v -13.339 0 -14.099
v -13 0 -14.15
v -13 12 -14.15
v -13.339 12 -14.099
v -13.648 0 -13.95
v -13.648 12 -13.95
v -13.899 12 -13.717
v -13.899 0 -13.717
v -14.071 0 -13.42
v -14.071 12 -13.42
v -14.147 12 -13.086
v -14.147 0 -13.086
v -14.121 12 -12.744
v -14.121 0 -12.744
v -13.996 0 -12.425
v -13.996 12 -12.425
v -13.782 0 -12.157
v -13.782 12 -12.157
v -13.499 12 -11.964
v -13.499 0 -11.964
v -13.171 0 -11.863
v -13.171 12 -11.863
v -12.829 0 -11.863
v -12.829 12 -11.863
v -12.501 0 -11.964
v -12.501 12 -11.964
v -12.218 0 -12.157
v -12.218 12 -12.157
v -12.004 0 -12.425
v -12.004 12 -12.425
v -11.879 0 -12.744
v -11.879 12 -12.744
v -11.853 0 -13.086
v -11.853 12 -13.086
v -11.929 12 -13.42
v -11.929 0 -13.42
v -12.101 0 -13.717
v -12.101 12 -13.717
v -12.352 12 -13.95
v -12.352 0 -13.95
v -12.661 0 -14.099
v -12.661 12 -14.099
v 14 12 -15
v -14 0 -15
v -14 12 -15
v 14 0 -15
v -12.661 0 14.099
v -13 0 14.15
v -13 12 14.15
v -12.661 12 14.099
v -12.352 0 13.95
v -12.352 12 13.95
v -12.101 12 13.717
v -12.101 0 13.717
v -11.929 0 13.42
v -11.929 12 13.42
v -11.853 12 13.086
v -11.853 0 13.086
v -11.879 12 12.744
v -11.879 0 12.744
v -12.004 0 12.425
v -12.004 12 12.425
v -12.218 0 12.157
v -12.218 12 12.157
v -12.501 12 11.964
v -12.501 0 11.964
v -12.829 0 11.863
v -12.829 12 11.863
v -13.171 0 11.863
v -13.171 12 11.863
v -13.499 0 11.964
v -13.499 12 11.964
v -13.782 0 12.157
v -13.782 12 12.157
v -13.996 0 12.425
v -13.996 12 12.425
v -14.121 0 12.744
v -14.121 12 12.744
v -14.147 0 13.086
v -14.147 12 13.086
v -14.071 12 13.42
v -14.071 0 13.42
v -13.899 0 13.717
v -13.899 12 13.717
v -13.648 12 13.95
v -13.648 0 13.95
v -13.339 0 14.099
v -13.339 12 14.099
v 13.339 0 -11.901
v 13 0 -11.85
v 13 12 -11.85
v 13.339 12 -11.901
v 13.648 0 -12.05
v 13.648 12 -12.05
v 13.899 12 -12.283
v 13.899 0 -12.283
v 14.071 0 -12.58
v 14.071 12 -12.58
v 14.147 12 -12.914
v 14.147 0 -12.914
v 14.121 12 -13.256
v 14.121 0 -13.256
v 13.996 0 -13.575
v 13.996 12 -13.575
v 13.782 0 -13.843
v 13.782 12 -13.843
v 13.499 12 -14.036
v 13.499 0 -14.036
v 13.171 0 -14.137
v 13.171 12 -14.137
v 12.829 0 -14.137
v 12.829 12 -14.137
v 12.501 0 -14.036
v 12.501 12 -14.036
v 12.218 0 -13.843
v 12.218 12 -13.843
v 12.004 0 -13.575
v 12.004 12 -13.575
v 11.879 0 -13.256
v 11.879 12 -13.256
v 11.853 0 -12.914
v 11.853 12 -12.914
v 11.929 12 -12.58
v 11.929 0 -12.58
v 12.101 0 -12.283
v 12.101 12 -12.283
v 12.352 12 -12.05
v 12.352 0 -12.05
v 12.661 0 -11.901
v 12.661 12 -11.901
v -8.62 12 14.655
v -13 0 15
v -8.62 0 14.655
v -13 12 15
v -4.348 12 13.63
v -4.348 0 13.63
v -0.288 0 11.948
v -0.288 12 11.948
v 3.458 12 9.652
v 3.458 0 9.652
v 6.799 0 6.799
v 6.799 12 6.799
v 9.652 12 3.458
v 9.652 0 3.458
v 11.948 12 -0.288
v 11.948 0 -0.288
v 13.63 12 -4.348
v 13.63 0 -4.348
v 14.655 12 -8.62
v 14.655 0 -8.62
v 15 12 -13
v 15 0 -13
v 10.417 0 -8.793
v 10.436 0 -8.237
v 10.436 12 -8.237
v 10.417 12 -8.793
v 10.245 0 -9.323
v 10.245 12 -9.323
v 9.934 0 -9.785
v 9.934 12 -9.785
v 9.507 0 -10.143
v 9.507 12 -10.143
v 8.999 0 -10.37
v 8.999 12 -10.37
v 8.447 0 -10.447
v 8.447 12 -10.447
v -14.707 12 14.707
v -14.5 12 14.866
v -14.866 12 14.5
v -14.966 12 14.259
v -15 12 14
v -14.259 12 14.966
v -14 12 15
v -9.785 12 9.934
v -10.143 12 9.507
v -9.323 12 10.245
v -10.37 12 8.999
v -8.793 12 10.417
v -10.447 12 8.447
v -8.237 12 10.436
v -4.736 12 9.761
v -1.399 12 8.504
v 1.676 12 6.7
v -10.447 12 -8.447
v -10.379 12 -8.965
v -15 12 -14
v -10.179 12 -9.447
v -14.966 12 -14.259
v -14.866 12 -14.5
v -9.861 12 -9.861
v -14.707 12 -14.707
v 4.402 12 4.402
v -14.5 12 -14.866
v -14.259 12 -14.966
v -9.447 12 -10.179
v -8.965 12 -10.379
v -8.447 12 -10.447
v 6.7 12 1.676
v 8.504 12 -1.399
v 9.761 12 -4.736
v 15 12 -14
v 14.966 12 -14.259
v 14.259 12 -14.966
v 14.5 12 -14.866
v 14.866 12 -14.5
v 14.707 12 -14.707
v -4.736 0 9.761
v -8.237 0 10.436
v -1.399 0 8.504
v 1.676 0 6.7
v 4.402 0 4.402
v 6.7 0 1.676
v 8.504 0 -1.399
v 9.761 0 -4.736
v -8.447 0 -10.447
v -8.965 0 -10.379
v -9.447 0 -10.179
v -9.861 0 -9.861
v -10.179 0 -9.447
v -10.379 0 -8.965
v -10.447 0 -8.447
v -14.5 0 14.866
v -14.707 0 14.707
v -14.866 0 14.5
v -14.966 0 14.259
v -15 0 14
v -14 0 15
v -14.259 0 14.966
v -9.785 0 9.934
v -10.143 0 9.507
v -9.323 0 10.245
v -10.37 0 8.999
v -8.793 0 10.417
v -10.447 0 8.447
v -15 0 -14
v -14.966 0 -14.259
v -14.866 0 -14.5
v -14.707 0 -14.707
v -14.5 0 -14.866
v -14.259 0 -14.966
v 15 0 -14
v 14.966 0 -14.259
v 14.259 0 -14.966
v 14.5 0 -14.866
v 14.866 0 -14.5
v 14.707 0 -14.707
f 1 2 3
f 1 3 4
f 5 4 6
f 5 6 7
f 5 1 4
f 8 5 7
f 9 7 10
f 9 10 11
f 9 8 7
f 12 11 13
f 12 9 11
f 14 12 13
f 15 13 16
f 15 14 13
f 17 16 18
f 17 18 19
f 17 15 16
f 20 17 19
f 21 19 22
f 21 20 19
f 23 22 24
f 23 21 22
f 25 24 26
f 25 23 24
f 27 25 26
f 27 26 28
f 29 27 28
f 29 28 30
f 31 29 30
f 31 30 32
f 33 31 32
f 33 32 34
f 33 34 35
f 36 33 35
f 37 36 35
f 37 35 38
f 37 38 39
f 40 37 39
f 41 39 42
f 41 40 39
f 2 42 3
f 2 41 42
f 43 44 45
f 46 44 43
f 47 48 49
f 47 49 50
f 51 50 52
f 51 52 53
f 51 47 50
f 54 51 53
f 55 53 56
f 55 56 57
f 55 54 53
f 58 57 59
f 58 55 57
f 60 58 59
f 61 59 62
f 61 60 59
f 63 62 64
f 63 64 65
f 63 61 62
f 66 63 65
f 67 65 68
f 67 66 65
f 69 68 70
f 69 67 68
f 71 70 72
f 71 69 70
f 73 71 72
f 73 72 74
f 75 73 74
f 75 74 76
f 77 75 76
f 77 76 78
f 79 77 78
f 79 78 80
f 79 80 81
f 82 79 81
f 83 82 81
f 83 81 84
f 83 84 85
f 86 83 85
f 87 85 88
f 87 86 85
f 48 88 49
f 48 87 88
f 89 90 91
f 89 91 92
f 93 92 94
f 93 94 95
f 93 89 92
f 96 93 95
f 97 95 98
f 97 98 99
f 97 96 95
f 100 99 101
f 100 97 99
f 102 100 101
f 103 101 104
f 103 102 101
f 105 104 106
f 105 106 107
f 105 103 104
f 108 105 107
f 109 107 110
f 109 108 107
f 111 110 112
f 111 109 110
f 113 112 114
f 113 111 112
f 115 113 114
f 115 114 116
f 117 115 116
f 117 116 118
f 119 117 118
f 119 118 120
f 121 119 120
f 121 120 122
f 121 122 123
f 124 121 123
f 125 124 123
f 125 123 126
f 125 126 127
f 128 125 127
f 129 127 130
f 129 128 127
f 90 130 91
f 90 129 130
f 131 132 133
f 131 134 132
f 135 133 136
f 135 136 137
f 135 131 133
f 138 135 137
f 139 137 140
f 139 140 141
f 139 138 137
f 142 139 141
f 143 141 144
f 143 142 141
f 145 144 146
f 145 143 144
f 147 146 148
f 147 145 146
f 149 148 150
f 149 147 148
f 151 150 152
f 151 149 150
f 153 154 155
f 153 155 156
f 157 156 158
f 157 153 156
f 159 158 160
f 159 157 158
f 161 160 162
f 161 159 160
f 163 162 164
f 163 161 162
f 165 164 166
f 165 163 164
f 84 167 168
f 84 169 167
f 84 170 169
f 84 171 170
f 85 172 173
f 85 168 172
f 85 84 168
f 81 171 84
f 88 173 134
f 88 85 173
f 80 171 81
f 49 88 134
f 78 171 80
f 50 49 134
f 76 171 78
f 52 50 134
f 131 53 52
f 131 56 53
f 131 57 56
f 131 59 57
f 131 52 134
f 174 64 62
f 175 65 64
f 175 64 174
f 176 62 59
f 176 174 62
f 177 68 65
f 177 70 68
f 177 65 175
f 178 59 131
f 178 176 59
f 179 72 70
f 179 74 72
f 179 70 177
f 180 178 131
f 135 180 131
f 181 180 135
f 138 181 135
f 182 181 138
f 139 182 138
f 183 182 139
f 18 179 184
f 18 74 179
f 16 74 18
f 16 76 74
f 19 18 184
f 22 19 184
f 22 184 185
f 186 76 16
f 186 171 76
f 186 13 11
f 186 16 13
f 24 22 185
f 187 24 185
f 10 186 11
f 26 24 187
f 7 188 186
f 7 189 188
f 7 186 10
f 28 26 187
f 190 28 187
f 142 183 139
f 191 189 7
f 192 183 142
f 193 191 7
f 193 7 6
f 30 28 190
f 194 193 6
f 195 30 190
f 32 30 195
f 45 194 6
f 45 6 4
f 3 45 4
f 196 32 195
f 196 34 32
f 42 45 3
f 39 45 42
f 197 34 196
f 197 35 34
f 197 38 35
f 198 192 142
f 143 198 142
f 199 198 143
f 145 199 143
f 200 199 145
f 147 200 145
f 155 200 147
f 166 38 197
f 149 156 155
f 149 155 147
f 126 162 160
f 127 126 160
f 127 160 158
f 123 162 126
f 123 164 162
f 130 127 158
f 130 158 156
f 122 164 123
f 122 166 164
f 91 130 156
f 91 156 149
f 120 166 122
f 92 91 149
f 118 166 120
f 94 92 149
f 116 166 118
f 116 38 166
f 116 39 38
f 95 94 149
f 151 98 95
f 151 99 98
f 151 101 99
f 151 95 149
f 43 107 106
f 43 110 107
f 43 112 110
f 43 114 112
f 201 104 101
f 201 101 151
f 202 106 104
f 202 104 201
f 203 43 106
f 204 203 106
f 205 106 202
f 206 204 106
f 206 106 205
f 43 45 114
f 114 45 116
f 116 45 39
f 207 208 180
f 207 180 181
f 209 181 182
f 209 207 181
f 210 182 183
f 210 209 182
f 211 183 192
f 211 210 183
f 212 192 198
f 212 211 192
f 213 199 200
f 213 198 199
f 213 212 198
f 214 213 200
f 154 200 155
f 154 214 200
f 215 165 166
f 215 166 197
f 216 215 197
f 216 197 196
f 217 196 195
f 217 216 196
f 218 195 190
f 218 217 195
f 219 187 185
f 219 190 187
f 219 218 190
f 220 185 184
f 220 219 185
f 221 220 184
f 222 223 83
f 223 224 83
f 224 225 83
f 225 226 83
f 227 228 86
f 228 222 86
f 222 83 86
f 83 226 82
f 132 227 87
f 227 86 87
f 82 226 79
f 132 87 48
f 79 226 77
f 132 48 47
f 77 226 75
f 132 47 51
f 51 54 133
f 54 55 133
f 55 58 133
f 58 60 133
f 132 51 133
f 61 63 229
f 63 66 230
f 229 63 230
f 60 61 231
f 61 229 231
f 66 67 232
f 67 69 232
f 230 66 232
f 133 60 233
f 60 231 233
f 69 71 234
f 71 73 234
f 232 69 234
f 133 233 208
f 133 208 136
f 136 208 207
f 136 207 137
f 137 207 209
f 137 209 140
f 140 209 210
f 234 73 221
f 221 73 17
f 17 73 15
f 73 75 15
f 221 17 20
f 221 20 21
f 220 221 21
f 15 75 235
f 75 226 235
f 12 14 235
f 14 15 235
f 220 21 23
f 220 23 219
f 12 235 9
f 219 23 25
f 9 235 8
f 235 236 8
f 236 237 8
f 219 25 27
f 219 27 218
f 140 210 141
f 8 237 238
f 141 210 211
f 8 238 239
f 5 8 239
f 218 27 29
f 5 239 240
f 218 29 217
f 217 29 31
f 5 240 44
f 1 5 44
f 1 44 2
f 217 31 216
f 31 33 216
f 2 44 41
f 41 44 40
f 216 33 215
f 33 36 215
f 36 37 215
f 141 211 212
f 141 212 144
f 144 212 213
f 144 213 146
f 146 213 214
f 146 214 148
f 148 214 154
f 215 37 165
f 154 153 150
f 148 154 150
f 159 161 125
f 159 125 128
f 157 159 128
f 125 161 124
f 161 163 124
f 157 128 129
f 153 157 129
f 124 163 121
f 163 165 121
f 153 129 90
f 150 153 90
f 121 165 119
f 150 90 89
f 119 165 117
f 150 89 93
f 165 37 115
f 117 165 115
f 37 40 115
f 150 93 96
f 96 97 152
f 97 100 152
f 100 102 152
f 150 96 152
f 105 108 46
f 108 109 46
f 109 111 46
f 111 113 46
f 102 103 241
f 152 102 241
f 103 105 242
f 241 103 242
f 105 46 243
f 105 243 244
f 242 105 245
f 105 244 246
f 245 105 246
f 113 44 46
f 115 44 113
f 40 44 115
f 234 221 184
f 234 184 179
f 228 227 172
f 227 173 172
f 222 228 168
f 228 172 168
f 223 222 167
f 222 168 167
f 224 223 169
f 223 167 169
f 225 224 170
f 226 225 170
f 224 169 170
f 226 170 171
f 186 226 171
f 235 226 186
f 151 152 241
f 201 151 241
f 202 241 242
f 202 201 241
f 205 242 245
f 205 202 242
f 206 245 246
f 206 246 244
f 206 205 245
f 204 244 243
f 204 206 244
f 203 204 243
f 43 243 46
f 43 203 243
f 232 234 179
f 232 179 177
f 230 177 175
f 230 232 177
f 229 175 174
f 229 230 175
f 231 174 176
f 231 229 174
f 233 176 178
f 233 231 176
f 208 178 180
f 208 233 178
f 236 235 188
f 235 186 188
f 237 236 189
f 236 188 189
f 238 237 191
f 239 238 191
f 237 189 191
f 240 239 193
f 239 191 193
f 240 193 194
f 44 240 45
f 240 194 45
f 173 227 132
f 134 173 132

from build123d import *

# Parameters (mm, degrees)
SKETCH_1_W          = 30
SKETCH_1_H          = 30
SKETCH_1_R          = 1.15
EXTRUDE_1_DEPTH     = 12
FILLET_1_R          = 28
FILLET_2_R          = 1
CUT_EXTRUDE_3_DEPTH = 22


with BuildPart() as part:
    # 草图1 → 凸台-拉伸1 (new body)
    with BuildSketch(Plane(origin=(0, 0, 0), x_dir=(1, 0, 0), z_dir=(0, 1, 0))):
        Rectangle(SKETCH_1_W, SKETCH_1_H)
        with Locations(Location((13, 13, 0), (0, 0, 270))):
            Circle(SKETCH_1_R, mode=Mode.SUBTRACT)
        with Locations(Location((13, -13, 0), (0, 0, 90))):
            Circle(SKETCH_1_R, mode=Mode.SUBTRACT)
        with Locations(Location((-13, -13, 0), (0, 0, 270))):
            Circle(SKETCH_1_R, mode=Mode.SUBTRACT)
        with Locations(Location((-13, 13, 0), (0, 0, 90))):
            Circle(SKETCH_1_R, mode=Mode.SUBTRACT)
    extrude(amount=EXTRUDE_1_DEPTH)

    # 圆角1
    fillet_1_edges = [part.edges().sort_by_distance(p)[0] for p in [
        (15, 6, 15),
    ]]
    fillet(fillet_1_edges, radius=FILLET_1_R)

    # 圆角2
    fillet_2_edges = [part.edges().sort_by_distance(p)[0] for p in [
        (-15, 6, 15),
        (-15, 6, -15),
        (15, 6, -15),
    ]]
    fillet(fillet_2_edges, radius=FILLET_2_R)

    # 草图2 → 切除-拉伸3 (cut)
    with BuildSketch(Plane(origin=(0, 0, 0), x_dir=(1, 0, 0), z_dir=(0, 1, 0))):
        with BuildLine():
            Line((8.447221814, 10.447221814), (-8.447221814, 10.447221814))
            ThreePointArc((-8.447221814, 10.447221814), (-9.861435376, 9.861435376), (-10.447221814, 8.447221814))
            Line((-10.447221814, 8.447221814), (-10.447221814, -8.447221814))
            ThreePointArc((-10.447221814, -8.447221814), (-9.784933922, -9.934005697), (-8.236695498, -10.436110617))
            ThreePointArc((-8.236695498, -10.436110617), (4.402020591, -4.402020591), (10.436110617, 8.236695498))
            ThreePointArc((10.436110617, 8.236695498), (9.934005697, 9.784933922), (8.447221814, 10.447221814))
        make_face()
    extrude(amount=CUT_EXTRUDE_3_DEPTH, mode=Mode.SUBTRACT)


solid = part.part
